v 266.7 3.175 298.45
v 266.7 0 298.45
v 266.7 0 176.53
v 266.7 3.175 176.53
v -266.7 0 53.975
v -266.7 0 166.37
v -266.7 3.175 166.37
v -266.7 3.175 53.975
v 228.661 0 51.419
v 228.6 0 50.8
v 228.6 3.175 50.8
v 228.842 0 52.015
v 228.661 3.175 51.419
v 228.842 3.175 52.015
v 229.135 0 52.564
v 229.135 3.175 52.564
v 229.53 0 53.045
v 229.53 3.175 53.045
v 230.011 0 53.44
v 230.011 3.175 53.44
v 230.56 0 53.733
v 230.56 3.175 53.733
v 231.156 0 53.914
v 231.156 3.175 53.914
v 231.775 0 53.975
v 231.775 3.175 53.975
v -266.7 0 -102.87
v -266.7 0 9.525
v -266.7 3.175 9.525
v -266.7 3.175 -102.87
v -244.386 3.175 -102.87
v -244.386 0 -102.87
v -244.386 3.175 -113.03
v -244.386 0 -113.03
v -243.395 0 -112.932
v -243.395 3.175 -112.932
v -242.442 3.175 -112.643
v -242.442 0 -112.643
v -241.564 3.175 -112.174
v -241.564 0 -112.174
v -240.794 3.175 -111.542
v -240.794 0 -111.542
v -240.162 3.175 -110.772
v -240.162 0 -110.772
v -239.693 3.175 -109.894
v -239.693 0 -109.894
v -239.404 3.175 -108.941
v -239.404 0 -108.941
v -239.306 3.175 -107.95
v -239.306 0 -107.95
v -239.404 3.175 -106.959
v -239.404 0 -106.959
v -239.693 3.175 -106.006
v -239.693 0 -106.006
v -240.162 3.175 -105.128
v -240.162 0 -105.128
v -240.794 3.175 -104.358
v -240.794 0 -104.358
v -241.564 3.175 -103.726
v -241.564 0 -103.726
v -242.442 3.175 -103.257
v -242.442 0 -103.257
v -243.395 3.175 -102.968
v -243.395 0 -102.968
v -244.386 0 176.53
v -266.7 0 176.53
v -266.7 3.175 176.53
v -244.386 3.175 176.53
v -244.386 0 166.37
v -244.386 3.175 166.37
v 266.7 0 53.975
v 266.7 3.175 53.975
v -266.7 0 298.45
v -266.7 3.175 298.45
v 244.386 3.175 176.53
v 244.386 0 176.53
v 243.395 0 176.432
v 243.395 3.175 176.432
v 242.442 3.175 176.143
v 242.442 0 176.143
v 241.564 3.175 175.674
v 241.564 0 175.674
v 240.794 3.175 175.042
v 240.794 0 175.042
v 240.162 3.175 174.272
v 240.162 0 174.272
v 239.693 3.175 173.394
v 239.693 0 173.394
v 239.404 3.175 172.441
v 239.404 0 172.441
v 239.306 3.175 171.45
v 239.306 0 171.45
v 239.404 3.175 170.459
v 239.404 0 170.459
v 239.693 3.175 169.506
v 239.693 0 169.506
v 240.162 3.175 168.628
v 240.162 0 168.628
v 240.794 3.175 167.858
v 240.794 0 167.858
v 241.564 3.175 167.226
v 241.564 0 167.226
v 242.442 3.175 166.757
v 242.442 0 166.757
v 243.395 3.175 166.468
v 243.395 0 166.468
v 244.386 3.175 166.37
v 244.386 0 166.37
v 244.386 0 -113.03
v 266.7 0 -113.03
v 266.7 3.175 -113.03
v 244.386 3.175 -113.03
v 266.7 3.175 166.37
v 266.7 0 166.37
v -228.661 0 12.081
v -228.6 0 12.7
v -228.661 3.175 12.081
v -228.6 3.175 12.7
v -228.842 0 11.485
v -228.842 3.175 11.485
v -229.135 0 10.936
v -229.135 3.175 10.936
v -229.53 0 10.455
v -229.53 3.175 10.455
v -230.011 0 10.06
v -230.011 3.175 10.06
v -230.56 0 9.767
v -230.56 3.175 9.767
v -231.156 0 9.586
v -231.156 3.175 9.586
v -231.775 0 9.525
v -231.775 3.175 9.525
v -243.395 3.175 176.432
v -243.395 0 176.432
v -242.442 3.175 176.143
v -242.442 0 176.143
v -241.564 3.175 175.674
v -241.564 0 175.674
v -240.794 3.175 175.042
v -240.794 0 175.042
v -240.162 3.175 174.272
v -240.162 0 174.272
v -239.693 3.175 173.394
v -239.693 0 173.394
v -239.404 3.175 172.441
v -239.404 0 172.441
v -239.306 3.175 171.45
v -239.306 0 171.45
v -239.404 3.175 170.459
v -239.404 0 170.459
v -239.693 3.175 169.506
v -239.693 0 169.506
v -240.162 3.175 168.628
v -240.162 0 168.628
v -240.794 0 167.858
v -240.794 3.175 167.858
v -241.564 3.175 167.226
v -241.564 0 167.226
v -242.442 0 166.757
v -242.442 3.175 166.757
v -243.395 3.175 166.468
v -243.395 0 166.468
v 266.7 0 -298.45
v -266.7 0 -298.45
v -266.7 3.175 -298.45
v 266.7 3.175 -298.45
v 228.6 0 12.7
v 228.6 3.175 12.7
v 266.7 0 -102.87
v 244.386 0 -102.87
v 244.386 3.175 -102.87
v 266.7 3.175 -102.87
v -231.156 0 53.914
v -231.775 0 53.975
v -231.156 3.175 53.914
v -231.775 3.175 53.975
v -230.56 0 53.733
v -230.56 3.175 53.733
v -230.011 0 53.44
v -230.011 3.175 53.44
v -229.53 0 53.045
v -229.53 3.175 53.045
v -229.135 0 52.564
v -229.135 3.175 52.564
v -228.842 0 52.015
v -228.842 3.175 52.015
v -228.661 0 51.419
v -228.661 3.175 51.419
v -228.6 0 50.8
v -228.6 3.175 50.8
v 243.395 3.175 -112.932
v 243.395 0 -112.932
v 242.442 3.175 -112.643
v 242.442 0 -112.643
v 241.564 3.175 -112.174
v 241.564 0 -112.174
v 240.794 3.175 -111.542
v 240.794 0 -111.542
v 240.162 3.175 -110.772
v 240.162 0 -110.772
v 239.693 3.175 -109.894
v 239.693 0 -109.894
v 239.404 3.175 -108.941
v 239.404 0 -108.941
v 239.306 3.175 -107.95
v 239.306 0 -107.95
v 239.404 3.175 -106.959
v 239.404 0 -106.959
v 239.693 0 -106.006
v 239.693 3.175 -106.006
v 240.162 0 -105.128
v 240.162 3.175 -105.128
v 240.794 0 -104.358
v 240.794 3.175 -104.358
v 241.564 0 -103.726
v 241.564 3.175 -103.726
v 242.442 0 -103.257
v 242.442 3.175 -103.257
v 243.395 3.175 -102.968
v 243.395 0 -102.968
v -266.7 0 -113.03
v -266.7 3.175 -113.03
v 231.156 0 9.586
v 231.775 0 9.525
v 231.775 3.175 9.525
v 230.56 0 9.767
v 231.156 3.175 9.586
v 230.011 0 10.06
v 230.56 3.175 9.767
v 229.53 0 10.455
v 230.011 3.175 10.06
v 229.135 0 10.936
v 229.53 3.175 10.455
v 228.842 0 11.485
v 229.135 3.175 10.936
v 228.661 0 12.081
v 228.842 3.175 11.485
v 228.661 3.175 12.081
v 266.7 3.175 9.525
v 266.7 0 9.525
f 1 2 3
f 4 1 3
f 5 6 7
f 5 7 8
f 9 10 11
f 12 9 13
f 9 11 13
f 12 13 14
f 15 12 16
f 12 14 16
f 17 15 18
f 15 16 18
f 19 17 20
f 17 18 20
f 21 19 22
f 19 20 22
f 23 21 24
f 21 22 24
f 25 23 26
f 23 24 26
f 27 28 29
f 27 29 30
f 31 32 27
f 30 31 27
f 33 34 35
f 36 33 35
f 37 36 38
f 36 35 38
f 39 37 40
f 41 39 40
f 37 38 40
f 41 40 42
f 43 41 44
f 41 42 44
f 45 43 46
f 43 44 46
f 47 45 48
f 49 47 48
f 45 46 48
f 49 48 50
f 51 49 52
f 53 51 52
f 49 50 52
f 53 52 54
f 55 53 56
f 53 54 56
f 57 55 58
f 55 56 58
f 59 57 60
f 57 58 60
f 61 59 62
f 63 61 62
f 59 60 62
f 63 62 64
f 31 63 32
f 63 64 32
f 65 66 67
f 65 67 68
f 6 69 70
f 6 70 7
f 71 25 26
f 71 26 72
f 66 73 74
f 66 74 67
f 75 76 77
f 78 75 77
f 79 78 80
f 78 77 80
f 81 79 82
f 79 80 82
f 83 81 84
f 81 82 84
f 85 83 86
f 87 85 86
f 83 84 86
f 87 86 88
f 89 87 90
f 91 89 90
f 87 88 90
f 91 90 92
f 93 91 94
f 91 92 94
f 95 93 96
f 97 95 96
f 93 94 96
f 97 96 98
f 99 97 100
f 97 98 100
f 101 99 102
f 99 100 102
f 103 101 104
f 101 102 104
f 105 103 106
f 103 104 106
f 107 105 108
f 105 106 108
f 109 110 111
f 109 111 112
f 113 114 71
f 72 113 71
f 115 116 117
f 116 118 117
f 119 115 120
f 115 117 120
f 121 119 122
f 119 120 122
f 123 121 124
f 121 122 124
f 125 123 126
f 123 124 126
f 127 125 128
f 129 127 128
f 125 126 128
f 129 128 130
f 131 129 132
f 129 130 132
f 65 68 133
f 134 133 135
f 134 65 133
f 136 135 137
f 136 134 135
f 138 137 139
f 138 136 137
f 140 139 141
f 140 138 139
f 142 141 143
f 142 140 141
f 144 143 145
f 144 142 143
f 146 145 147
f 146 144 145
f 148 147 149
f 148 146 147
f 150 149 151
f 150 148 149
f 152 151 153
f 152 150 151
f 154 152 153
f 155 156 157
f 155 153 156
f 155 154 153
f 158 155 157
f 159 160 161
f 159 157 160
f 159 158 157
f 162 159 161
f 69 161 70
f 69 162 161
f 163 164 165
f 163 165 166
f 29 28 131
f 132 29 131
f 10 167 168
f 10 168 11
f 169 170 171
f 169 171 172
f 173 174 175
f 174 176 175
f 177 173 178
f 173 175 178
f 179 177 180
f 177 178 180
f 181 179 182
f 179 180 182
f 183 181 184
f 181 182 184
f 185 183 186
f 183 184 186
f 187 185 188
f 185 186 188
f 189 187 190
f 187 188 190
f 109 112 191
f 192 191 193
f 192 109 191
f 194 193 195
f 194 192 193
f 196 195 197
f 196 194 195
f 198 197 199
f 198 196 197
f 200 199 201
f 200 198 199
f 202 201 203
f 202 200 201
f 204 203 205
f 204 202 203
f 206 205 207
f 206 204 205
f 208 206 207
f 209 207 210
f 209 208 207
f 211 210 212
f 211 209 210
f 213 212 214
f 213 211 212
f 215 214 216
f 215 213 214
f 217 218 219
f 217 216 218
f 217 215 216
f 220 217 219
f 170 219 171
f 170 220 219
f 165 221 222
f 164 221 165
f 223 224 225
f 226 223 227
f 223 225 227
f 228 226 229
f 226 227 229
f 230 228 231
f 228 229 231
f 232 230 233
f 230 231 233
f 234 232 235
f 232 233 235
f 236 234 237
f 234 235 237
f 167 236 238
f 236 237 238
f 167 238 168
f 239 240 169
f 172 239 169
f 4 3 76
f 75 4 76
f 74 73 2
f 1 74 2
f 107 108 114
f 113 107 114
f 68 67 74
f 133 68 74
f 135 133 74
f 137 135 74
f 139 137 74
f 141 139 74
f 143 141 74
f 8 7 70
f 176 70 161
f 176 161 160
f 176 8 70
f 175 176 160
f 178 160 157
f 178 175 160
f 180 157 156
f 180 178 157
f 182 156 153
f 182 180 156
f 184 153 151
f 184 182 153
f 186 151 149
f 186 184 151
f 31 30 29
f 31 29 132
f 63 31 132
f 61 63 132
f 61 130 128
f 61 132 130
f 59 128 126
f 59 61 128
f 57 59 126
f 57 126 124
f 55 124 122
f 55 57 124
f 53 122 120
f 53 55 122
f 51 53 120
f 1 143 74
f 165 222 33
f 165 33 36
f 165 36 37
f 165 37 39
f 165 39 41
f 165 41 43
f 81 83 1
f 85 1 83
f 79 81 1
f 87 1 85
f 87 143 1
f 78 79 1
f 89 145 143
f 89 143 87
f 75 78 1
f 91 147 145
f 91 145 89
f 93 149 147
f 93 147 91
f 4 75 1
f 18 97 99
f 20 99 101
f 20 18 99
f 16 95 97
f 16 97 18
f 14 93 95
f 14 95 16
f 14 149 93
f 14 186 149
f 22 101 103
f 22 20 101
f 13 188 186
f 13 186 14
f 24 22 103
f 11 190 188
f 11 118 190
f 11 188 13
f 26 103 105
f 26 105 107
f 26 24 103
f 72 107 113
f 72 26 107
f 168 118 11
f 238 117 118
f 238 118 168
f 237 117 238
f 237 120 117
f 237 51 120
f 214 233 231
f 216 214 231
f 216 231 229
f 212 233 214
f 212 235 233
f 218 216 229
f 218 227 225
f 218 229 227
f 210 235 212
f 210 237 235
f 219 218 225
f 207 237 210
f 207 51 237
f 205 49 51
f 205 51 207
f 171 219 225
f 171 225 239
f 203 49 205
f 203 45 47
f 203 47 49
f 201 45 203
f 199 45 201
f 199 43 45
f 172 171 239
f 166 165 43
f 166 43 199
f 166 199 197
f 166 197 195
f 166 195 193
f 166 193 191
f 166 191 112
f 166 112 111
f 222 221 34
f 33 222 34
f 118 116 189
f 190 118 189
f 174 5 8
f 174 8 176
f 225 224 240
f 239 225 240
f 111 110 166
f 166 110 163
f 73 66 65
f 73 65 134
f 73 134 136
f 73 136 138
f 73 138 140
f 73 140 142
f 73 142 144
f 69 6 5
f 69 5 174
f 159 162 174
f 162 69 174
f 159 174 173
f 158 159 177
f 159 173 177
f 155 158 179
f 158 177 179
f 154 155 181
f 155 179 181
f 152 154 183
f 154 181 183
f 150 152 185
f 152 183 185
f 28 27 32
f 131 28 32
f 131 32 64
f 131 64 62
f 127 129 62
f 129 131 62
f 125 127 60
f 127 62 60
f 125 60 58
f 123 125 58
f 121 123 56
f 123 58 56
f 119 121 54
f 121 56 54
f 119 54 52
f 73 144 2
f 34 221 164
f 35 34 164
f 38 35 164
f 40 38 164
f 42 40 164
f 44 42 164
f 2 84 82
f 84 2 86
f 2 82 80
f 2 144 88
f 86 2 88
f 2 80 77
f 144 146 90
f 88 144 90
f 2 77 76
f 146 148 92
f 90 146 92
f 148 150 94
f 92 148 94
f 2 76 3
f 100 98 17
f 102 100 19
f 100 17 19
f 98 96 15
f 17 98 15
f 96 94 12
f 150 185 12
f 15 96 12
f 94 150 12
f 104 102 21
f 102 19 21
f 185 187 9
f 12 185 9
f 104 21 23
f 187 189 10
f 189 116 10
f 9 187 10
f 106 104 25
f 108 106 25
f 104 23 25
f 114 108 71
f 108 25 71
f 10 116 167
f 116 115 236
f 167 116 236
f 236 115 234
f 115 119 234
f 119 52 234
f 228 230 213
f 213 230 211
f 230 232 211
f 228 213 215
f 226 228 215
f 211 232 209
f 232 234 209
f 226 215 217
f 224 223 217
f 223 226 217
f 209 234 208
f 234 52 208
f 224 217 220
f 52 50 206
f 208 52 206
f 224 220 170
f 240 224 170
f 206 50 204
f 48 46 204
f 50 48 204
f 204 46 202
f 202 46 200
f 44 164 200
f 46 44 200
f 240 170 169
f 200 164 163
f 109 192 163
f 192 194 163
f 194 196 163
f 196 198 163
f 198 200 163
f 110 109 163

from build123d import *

# Parameters (mm, degrees)
SKETCH1_W           = 533.4
SKETCH1_H           = 596.9
BOSS_EXTRUDE1_DEPTH = 3.175
SKETCH8_W           = 38.1
SKETCH8_H           = 44.45
CUT_EXTRUDE2_DEPTH  = 4.175
FILLET1_R           = 3.175
CUT_EXTRUDE3_DEPTH  = 4.175


with BuildPart() as part:
    # Sketch1 → Boss-Extrude1 (new body)
    with BuildSketch(Plane(origin=(0, 0, 0), x_dir=(1, 0, 0), z_dir=(0, 1, 0))):
        Rectangle(SKETCH1_W, SKETCH1_H)
    extrude(amount=BOSS_EXTRUDE1_DEPTH)

    # Sketch8 → Cut-Extrude2 (cut, through all)
    with BuildSketch(Plane.XZ):
        with Locations((-247.65, 31.75)):
            Rectangle(SKETCH8_W, SKETCH8_H)
        with Locations((247.65, 31.75)):
            Rectangle(SKETCH8_W, SKETCH8_H)
    extrude(amount=-CUT_EXTRUDE2_DEPTH, mode=Mode.SUBTRACT)

    # Fillet1
    fillet1_edges = [part.edges().sort_by_distance(p)[0] for p in [
        (-228.6, 1.5875, 53.975),
        (-228.6, 1.5875, 9.525),
        (228.6, 1.5875, 9.525),
        (228.6, 1.5875, 53.975),
    ]]
    fillet(fillet1_edges, radius=FILLET1_R)

    # Sketch9 → Cut-Extrude3 (cut, through all)
    with BuildSketch(Plane.XZ):
        with BuildLine():
            Line((-266.7, 176.530000343), (-244.3861, 176.530000343))
            ThreePointArc((-244.3861, 176.530000343), (-239.3061, 171.450000343), (-244.3861, 166.370000343))
            Line((-244.3861, 166.370000343), (-266.7, 166.370000343))
            ThreePointArc((-266.7, 166.370000343), (-271.78, 171.450000343), (-266.7, 176.530000343))
        make_face()
        with BuildLine():
            Line((-266.7, -113.030000343), (-244.3861, -113.030000343))
            ThreePointArc((-244.3861, -113.030000343), (-239.3061, -107.950000343), (-244.3861, -102.870000343))
            Line((-244.3861, -102.870000343), (-266.7, -102.870000343))
            ThreePointArc((-266.7, -102.870000343), (-271.78, -107.950000343), (-266.7, -113.030000343))
        make_face()
        with BuildLine():
            Line((266.7, 176.530000343), (244.3861, 176.530000343))
            ThreePointArc((244.3861, 176.530000343), (239.3061, 171.450000343), (244.3861, 166.370000343))
            Line((244.3861, 166.370000343), (266.7, 166.370000343))
            ThreePointArc((266.7, 166.370000343), (271.78, 171.450000343), (266.7, 176.530000343))
        make_face()
        with BuildLine():
            Line((266.7, -113.030000343), (244.3861, -113.030000343))
            ThreePointArc((244.3861, -113.030000343), (239.3061, -107.950000343), (244.3861, -102.870000343))
            Line((244.3861, -102.870000343), (266.7, -102.870000343))
            ThreePointArc((266.7, -102.870000343), (271.78, -107.950000343), (266.7, -113.030000343))
        make_face()
    extrude(amount=-CUT_EXTRUDE3_DEPTH, mode=Mode.SUBTRACT)


solid = part.part
